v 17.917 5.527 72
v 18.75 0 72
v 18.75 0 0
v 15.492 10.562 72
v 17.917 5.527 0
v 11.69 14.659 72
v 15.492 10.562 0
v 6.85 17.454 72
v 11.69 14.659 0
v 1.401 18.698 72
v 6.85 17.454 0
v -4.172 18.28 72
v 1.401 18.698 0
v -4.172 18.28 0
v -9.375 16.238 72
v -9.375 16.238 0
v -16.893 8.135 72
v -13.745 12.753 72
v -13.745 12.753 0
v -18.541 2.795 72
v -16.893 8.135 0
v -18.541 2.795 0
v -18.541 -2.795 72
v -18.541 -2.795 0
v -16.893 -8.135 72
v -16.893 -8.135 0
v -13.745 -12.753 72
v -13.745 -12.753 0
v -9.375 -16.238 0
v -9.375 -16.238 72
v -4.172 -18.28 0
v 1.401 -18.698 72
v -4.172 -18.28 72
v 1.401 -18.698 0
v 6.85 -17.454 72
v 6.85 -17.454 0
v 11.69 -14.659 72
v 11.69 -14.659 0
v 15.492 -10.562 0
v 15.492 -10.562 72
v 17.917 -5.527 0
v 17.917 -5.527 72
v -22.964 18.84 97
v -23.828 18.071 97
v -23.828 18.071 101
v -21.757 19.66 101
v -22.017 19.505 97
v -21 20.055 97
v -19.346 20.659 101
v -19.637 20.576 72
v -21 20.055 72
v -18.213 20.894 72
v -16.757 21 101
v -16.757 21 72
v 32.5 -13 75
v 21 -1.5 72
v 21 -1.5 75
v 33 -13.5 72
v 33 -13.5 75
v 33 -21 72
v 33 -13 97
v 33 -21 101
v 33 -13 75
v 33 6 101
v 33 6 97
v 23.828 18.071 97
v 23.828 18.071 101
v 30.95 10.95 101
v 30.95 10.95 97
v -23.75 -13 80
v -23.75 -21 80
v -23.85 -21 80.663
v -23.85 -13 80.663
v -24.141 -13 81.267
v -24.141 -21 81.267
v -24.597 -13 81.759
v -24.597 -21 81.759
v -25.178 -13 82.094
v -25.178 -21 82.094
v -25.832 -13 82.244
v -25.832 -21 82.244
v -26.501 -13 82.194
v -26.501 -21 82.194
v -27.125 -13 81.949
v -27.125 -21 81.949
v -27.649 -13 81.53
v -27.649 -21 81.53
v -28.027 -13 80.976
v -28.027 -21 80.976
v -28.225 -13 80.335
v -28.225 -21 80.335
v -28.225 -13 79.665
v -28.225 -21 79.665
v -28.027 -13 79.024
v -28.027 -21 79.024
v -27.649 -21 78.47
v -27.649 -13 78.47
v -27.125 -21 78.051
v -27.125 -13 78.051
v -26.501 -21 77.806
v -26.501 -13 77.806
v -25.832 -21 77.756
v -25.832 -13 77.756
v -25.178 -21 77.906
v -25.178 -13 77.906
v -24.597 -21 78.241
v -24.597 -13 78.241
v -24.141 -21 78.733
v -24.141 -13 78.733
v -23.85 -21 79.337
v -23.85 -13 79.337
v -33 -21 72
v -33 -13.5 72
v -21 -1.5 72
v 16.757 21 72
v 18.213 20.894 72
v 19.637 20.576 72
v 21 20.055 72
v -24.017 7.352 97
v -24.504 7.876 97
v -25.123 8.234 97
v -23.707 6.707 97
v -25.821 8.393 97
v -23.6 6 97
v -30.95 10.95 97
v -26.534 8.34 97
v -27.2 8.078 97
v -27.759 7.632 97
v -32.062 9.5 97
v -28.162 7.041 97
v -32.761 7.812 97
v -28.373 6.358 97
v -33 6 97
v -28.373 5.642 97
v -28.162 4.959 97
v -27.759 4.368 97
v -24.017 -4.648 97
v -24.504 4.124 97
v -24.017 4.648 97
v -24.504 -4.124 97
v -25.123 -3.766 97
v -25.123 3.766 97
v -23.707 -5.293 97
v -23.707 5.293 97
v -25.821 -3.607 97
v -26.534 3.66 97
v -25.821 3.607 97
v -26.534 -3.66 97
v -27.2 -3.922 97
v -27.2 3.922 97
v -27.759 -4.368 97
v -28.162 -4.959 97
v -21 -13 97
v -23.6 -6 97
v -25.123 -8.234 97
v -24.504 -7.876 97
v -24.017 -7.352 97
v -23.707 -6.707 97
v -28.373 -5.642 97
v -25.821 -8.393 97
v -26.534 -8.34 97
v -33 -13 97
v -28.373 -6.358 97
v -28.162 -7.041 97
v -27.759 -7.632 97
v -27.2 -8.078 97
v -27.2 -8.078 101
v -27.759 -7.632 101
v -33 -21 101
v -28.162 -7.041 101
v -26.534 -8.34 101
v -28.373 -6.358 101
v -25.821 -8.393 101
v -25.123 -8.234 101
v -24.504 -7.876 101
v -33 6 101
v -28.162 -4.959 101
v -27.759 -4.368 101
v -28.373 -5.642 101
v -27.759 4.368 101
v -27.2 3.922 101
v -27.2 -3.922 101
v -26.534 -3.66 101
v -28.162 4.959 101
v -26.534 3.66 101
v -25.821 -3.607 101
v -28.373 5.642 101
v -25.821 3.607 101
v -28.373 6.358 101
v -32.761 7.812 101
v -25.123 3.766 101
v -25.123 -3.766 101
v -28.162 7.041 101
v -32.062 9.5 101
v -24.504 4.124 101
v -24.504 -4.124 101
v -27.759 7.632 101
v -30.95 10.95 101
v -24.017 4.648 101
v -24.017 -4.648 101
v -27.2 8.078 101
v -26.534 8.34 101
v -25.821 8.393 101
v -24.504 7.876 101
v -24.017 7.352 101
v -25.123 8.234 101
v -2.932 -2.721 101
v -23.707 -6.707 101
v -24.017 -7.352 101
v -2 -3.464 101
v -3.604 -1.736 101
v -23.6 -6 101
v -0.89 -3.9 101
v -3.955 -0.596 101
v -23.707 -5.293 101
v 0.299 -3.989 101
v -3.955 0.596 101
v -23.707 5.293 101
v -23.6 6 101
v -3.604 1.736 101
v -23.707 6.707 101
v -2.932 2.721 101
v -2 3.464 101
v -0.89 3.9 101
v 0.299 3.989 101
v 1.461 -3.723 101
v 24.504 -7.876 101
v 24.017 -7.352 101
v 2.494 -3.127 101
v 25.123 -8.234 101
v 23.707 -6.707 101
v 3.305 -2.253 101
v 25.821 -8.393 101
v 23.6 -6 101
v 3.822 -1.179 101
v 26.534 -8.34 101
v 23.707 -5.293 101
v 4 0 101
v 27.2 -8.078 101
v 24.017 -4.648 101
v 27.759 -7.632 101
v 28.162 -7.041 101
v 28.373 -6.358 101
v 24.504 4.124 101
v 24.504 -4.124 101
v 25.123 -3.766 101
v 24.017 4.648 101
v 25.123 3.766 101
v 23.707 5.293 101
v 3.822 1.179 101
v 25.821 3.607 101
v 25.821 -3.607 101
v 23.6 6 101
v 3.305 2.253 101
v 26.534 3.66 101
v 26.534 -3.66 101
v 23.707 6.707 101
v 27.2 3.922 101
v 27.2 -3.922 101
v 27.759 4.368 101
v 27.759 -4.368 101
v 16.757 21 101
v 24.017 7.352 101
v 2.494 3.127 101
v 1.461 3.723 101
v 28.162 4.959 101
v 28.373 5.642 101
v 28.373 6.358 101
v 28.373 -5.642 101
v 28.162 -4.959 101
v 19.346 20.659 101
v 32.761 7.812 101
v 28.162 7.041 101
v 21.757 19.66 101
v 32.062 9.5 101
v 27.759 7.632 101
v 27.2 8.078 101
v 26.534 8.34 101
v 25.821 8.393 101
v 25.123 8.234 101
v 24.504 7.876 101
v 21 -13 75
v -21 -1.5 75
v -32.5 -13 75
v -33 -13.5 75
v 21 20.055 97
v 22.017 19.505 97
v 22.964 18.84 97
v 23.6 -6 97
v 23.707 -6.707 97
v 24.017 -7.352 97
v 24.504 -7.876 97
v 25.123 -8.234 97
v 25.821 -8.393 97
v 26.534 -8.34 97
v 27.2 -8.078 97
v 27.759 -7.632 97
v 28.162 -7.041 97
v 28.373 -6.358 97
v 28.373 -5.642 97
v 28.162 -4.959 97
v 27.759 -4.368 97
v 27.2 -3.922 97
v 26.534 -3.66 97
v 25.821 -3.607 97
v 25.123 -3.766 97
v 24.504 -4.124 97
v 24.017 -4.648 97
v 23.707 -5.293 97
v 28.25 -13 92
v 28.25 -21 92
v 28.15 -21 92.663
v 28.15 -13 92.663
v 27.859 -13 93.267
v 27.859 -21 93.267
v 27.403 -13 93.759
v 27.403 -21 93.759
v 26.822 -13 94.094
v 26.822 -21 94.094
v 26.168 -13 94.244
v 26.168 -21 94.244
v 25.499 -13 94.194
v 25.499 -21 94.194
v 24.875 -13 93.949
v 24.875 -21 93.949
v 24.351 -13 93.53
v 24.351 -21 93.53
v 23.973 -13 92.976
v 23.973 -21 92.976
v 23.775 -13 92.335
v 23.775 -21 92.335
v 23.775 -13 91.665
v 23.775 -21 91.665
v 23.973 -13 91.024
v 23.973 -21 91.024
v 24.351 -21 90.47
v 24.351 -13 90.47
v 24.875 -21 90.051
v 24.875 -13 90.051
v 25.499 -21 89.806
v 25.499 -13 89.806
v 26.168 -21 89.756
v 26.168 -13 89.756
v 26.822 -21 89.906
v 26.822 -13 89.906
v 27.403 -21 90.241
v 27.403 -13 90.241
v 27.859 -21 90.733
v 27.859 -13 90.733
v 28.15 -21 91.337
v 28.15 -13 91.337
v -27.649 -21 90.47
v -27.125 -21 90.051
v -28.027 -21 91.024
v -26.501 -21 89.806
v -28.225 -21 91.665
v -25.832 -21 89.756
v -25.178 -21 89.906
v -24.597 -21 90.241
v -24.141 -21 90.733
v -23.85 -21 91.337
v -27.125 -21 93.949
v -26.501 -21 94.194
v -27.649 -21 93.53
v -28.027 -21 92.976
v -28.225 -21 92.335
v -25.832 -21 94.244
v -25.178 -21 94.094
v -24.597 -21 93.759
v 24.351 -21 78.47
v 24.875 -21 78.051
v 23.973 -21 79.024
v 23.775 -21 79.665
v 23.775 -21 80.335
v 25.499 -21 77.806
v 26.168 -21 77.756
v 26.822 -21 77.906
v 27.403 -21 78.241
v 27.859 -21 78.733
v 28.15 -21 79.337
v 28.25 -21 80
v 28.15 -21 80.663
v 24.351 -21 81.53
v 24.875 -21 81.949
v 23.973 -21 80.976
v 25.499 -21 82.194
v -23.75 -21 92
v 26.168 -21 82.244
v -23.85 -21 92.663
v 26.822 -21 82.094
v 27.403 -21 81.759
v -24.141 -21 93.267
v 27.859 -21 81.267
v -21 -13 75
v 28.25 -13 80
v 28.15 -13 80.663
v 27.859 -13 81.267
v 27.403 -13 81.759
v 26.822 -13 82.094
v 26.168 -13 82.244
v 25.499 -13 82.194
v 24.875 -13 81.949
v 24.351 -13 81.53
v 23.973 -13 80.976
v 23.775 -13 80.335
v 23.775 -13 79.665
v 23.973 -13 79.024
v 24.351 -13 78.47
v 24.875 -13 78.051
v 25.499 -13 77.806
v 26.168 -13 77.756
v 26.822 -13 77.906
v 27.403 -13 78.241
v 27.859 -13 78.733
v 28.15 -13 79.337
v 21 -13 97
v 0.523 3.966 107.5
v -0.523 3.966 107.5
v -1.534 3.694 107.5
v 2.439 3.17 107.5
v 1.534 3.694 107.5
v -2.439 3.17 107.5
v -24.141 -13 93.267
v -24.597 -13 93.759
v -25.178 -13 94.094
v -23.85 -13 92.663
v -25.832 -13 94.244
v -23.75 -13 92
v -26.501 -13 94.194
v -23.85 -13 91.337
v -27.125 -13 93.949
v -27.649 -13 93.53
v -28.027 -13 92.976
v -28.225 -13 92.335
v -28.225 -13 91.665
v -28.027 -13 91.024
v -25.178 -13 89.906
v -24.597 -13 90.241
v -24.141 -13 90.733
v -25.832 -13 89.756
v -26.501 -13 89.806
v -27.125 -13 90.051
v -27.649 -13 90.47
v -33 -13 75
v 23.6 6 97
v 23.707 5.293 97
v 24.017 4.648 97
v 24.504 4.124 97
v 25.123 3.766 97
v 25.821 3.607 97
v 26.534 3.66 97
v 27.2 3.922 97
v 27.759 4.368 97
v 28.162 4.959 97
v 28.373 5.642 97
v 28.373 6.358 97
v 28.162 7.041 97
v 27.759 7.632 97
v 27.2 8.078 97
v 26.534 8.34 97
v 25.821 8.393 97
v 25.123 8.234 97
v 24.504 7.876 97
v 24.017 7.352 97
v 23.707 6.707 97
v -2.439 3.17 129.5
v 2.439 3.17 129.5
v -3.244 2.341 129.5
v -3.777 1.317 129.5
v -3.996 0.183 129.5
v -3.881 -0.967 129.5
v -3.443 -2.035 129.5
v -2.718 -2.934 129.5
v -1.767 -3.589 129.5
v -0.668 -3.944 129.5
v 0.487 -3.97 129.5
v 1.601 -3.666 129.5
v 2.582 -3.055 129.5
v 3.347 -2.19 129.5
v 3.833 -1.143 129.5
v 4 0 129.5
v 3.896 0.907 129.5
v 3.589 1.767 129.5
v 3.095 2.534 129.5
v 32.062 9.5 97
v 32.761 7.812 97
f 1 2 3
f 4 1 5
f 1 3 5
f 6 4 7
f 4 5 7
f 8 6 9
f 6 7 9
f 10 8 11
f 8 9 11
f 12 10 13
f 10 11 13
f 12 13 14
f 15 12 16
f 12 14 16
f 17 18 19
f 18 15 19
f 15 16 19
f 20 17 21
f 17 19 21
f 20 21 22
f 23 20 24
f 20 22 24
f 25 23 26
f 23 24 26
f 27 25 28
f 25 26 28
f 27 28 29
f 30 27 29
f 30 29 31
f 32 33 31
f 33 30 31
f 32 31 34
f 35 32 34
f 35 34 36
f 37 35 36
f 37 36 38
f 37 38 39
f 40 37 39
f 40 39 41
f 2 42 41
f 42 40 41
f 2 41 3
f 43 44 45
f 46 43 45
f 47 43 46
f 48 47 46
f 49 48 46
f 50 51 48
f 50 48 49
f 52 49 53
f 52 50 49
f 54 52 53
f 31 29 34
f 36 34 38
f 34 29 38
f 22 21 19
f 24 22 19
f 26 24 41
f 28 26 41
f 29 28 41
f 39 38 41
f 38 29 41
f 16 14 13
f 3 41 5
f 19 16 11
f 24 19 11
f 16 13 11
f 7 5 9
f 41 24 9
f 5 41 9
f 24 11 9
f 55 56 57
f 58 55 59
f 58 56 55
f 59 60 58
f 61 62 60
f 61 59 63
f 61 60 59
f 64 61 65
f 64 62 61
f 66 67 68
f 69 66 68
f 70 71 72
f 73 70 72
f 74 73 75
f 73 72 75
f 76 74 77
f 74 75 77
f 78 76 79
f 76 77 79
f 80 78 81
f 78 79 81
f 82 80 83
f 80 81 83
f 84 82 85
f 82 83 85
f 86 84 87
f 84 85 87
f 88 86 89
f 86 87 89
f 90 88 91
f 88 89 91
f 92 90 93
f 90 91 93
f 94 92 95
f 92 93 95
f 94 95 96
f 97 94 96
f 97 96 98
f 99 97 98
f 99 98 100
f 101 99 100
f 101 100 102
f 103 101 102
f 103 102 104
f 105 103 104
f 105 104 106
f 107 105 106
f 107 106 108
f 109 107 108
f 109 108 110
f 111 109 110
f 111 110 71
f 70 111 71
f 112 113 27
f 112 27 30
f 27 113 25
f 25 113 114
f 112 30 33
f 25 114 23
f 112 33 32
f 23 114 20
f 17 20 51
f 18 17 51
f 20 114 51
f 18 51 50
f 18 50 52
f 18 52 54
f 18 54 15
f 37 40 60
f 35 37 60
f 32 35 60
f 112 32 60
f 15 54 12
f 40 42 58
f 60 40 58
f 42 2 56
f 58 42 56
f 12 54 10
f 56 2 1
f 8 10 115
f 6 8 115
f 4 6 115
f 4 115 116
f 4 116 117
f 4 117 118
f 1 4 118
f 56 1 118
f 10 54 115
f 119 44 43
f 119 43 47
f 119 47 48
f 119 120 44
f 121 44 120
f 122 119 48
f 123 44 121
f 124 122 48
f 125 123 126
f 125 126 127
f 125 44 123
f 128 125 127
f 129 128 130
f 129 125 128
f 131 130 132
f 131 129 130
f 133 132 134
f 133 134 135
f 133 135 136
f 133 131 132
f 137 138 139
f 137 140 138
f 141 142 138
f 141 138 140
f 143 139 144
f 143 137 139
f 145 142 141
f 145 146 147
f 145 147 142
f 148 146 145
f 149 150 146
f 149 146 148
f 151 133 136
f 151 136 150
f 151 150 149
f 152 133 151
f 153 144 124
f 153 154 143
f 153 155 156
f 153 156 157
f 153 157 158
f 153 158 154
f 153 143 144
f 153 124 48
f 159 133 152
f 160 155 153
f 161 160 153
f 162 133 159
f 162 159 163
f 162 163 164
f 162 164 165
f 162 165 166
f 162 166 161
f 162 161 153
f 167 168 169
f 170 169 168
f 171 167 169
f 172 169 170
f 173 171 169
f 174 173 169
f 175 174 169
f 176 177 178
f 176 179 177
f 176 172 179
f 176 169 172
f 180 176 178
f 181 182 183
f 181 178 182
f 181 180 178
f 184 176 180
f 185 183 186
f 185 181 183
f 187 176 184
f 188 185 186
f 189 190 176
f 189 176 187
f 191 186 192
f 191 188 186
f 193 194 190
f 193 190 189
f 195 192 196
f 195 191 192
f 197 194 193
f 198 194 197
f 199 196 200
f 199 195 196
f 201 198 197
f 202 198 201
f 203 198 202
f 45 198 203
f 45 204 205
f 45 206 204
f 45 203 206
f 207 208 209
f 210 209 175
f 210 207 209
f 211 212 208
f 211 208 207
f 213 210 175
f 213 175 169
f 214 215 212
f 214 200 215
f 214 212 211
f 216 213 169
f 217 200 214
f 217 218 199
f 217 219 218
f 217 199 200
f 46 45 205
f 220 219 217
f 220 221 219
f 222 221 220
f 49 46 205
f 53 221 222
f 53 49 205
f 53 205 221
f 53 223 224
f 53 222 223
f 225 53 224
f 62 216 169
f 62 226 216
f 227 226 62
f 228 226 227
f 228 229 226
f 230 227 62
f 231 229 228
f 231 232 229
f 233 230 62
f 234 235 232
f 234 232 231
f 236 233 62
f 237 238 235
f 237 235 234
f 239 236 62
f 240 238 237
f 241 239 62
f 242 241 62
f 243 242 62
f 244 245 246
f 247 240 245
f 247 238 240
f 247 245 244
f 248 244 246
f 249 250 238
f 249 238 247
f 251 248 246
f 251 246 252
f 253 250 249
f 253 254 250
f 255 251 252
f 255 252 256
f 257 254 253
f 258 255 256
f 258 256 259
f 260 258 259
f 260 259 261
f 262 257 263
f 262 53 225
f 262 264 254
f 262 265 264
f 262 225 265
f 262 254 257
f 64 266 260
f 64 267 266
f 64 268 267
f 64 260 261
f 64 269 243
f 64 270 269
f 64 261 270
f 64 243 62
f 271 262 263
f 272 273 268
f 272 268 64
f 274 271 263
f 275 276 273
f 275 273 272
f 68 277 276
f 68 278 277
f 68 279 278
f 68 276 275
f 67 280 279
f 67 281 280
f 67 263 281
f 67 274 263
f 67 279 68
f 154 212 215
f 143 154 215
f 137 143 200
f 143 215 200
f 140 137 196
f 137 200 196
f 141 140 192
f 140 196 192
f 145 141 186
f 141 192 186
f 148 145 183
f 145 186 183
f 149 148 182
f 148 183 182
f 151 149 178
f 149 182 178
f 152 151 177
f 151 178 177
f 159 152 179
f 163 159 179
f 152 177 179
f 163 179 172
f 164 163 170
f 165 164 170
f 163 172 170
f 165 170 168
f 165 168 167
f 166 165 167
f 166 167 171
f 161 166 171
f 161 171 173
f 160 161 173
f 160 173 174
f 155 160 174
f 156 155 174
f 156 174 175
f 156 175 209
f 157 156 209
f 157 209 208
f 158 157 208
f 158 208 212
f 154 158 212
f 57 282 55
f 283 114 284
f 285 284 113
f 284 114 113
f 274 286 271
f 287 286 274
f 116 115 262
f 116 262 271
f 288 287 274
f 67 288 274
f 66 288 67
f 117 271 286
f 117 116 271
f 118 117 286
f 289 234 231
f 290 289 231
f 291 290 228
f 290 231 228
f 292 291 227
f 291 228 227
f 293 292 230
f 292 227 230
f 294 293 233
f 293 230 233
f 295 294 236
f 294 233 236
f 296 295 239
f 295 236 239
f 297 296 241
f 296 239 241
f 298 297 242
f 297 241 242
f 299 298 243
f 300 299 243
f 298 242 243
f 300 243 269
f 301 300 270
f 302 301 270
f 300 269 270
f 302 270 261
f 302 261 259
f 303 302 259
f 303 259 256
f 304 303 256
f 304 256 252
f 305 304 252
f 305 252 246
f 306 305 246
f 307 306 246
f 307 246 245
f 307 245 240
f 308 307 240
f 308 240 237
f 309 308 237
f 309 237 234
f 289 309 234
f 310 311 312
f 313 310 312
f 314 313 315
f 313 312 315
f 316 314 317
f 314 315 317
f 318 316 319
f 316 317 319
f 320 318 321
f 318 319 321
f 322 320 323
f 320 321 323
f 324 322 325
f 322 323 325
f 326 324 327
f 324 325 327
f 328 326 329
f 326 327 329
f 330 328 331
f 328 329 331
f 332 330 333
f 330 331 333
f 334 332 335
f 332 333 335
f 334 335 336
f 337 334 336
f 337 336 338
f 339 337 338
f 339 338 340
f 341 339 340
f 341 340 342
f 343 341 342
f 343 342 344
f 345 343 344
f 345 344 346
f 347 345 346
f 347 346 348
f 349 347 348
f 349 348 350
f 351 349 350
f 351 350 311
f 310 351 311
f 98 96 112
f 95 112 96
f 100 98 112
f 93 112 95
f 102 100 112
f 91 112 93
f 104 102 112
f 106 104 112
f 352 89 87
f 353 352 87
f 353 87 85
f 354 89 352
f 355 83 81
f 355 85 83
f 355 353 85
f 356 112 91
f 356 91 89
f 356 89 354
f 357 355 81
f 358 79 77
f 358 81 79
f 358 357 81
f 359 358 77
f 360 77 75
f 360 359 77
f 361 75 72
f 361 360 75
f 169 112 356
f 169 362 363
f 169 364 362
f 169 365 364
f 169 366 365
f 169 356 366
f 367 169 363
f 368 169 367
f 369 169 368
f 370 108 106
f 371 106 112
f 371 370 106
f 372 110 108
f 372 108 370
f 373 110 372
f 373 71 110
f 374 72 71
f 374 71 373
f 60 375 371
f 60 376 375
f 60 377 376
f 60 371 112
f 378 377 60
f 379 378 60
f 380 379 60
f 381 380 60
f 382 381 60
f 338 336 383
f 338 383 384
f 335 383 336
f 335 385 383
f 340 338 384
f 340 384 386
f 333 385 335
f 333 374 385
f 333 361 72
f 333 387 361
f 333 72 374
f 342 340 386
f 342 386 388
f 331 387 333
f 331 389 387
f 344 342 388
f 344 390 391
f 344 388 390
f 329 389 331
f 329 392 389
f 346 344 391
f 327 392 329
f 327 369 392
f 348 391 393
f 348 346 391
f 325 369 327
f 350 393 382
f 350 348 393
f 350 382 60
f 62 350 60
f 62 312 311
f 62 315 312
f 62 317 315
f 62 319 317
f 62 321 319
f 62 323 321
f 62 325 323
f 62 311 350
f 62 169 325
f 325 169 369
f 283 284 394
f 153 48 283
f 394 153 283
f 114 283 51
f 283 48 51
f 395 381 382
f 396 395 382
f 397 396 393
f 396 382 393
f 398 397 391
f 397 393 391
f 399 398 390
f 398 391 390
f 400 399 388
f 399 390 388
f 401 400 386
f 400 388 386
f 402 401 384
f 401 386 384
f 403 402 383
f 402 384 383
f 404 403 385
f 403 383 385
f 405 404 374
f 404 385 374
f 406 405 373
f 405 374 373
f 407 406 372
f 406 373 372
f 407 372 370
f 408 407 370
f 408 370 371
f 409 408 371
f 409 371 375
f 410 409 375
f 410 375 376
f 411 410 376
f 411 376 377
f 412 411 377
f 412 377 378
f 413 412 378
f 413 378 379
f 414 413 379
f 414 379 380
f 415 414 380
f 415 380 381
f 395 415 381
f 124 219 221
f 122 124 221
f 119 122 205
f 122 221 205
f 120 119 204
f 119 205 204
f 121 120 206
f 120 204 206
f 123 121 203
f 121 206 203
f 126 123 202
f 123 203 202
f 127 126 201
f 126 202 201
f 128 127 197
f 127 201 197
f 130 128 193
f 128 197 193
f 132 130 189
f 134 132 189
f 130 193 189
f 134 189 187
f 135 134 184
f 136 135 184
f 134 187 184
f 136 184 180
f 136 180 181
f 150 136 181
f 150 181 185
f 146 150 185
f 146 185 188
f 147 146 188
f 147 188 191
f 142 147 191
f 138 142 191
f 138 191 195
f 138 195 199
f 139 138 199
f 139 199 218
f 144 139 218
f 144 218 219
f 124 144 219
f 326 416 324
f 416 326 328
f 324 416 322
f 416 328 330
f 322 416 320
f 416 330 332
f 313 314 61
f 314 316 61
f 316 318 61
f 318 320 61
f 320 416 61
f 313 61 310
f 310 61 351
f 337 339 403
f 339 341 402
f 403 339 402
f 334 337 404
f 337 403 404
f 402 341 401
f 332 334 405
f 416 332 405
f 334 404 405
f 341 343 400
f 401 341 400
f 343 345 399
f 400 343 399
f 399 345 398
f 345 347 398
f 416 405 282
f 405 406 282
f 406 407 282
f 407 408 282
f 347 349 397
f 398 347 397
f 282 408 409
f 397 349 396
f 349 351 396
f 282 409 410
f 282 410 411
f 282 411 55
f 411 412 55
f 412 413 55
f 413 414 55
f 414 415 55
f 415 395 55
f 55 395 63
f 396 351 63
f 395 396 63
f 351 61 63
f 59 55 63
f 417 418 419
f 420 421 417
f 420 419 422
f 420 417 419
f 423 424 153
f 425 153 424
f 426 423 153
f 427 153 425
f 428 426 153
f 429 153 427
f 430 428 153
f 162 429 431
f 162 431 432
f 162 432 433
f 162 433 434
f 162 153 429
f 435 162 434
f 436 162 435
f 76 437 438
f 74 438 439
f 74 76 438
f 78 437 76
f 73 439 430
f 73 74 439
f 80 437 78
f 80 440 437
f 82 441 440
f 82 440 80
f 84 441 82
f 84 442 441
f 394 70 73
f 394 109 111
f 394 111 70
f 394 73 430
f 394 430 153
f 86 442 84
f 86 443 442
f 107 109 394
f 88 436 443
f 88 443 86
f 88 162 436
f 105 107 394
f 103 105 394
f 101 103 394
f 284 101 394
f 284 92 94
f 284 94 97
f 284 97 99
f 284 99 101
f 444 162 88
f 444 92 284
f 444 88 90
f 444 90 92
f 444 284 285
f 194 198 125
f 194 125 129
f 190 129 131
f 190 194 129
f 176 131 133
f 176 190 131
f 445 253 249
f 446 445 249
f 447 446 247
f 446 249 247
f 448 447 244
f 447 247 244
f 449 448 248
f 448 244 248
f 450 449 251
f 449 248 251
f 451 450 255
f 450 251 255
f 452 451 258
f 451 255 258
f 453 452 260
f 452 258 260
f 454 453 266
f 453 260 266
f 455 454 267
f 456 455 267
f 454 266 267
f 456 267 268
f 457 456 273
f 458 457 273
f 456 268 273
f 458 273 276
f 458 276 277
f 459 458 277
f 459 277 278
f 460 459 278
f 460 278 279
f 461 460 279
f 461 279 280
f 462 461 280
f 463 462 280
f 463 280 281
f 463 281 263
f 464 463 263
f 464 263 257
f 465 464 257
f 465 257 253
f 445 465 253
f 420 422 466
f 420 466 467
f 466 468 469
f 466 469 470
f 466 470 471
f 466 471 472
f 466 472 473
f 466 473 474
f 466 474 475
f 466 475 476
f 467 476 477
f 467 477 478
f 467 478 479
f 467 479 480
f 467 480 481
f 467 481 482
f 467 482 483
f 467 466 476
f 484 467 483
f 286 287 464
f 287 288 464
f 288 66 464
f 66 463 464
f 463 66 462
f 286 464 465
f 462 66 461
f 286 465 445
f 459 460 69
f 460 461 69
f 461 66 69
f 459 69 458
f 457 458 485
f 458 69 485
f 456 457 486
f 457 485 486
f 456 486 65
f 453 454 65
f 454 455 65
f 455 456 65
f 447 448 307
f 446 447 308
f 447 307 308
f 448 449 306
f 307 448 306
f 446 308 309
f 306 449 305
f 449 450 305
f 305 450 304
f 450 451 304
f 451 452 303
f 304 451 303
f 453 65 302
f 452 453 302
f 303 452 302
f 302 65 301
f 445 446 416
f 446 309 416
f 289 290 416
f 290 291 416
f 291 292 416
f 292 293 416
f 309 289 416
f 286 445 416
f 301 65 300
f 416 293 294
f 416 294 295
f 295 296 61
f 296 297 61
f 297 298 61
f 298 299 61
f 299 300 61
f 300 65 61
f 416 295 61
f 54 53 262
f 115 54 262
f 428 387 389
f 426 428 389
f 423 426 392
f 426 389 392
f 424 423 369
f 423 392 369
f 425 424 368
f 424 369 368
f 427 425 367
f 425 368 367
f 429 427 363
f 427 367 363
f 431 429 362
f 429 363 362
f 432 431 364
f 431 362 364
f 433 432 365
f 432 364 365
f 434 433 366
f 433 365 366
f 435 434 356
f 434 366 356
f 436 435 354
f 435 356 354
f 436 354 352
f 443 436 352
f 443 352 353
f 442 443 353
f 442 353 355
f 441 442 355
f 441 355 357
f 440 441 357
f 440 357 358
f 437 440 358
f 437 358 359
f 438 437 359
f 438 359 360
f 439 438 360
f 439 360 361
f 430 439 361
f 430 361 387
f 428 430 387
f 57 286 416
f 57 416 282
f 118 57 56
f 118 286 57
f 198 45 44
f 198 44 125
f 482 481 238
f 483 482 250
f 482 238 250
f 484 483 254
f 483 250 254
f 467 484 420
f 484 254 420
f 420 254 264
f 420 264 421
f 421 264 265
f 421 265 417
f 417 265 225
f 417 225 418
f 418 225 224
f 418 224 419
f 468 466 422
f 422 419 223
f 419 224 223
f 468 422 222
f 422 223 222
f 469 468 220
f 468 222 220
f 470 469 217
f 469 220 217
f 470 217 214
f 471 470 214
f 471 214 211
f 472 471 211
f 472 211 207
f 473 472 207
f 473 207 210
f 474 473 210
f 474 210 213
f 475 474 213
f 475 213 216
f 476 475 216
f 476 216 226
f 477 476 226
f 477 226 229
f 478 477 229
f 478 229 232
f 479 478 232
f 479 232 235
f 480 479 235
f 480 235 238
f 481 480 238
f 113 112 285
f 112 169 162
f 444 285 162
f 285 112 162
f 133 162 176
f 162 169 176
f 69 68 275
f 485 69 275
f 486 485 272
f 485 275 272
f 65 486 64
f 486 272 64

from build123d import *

# Parameters (mm, degrees)
CROQUIS2_R              = 18.75
SALIENTE_EXTRUIR1_DEPTH = 129.5
CORTAR_EXTRUIR1_START   = -28.5
CROQUIS3_R              = 18.75
CROQUIS3_R_2            = 4
CORTAR_EXTRUIR1_DEPTH   = 28.5
CROQUIS4_W              = 66
CROQUIS4_H              = 42
SALIENTE_EXTRUIR2_DEPTH = 29
CROQUIS5_R              = 2.4
CORTAR_EXTRUIR2_DEPTH   = 109.309741021
CROQUIS6_R              = 2.25
CORTAR_EXTRUIR3_DEPTH   = 141.083011104
CORTAR_EXTRUIR4_DEPTH   = 12
REDONDEO1_R             = 10
CORTAR_EXTRUIR5_START   = -22
CORTAR_EXTRUIR5_DEPTH   = 22
SALIENTE_EXTRUIR3_START = -3
CROQUIS9_R              = 2.4
SALIENTE_EXTRUIR3_DEPTH = 3
CORTAR_EXTRUIR6_DEPTH   = 3


with BuildPart() as part:
    # Croquis2 → Saliente-Extruir1 (new body)
    with BuildSketch(Plane.XY):
        Circle(CROQUIS2_R)
    extrude(amount=SALIENTE_EXTRUIR1_DEPTH)

    # Croquis3 → Cortar-Extruir1 (cut)
    with BuildSketch(Plane.XY.offset(129.5).offset(CORTAR_EXTRUIR1_START)):
        Circle(CROQUIS3_R)
        Circle(CROQUIS3_R_2, mode=Mode.SUBTRACT)
    extrude(amount=CORTAR_EXTRUIR1_DEPTH, mode=Mode.SUBTRACT)

    # Croquis4 → Saliente-Extruir2 (add)
    with BuildSketch(Plane.XY.offset(101)):
        Rectangle(CROQUIS4_W, CROQUIS4_H)
    extrude(amount=-SALIENTE_EXTRUIR2_DEPTH)

    # Croquis5 → Cortar-Extruir2 (cut, through all)
    with BuildSketch(Plane.XY.offset(101)):
        with Locations((-26, 6)):
            Circle(CROQUIS5_R)
        with Locations((-26, -6)):
            Circle(CROQUIS5_R)
        with Locations(Location((26, -6, 0), (0, 0, 180))):
            Circle(CROQUIS5_R)
        with Locations(Location((26, 6, 0), (0, 0, 180))):
            Circle(CROQUIS5_R)
        with BuildLine():
            Line((-33, 6), (-33, 21))
            Line((-33, 21), (-20.899494937, 21))
            Line((-20.899494937, 21), (-30.949747468, 10.949747468))
            ThreePointArc((-30.949747468, 10.949747468), (-32.467156728, 8.678784027), (-33, 6))
        make_face()
        with BuildLine():
            Line((33, 21), (20.899494937, 21))
            Line((20.899494937, 21), (30.949747468, 10.949747468))
            ThreePointArc((30.949747468, 10.949747468), (32.467156728, 8.678784027), (33, 6))
            Line((33, 6), (33, 21))
        make_face()
    extrude(amount=-CORTAR_EXTRUIR2_DEPTH, mode=Mode.SUBTRACT)

    # Croquis6 → Cortar-Extruir3 (cut, through all)
    with BuildSketch(Plane.XZ.offset(21)):
        with Locations((-26, 92)):
            Circle(CROQUIS6_R)
        with Locations((-26, 80)):
            Circle(CROQUIS6_R)
        with Locations((26, 80)):
            Circle(CROQUIS6_R)
        with Locations((26, 92)):
            Circle(CROQUIS6_R)
    extrude(amount=-CORTAR_EXTRUIR3_DEPTH, mode=Mode.SUBTRACT)

    # Croquis7 → Cortar-Extruir4 (cut)
    with BuildSketch(Plane(origin=(33, 0, 0), x_dir=(0, 0, -1), z_dir=(1, 0, 0))):
        Polygon((-97, 21), (-97, -13), (-75, -13), (-75, -1.5), (-72, -1.5), (-72, 21), align=None)
    cortar_extruir4 = extrude(amount=-CORTAR_EXTRUIR4_DEPTH, mode=Mode.SUBTRACT)

    # Simetría1: Cortar-Extruir4 across plane
    add(cortar_extruir4.mirror(Plane(origin=(0, 0, 0), x_dir=(0, 0, 1), z_dir=(1, 0, 0))), mode=Mode.SUBTRACT)

    # Redondeo1
    redondeo1_edges = [part.edges().sort_by_distance(p)[0] for p in [
        (-20.899494937, 21, 86.5),
        (20.899494937, 21, 86.5),
    ]]
    fillet(redondeo1_edges, radius=REDONDEO1_R)

    # Croquis8 → Cortar-Extruir5 (cut)
    with BuildSketch(Plane.XY.offset(129.5).offset(CORTAR_EXTRUIR5_START)):
        with BuildLine():
            Line((-2.439487651, 3.17), (2.439487651, 3.17))
            ThreePointArc((2.439487651, 3.17), (0, 4), (-2.439487651, 3.17))
        make_face()
    extrude(amount=CORTAR_EXTRUIR5_DEPTH, mode=Mode.SUBTRACT)

    # Croquis9 → Saliente-Extruir3 (add)
    with BuildSketch(Plane(origin=(0, 0, 72), x_dir=(-1, 0, 0), z_dir=(0, 0, -1)).offset(SALIENTE_EXTRUIR3_START)):
        with Locations(Location((26, -6, 0), (0, 0, 180))):
            Circle(CROQUIS9_R)
        with Locations(Location((-26, -6, 0), (0, 0, 180))):
            Circle(CROQUIS9_R)
    extrude(amount=SALIENTE_EXTRUIR3_DEPTH)

    # Croquis10 → Cortar-Extruir6 (cut)
    with BuildSketch(Plane(origin=(0, 0, 72), x_dir=(-1, 0, 0), z_dir=(0, 0, -1))):
        Polygon((-21, -1.5), (-33, -13.5), (-33, -1.5), align=None)
        Polygon((33, -1.5), (21, -1.5), (33, -13.5), align=None)
    extrude(amount=-CORTAR_EXTRUIR6_DEPTH, mode=Mode.SUBTRACT)


solid = part.part
